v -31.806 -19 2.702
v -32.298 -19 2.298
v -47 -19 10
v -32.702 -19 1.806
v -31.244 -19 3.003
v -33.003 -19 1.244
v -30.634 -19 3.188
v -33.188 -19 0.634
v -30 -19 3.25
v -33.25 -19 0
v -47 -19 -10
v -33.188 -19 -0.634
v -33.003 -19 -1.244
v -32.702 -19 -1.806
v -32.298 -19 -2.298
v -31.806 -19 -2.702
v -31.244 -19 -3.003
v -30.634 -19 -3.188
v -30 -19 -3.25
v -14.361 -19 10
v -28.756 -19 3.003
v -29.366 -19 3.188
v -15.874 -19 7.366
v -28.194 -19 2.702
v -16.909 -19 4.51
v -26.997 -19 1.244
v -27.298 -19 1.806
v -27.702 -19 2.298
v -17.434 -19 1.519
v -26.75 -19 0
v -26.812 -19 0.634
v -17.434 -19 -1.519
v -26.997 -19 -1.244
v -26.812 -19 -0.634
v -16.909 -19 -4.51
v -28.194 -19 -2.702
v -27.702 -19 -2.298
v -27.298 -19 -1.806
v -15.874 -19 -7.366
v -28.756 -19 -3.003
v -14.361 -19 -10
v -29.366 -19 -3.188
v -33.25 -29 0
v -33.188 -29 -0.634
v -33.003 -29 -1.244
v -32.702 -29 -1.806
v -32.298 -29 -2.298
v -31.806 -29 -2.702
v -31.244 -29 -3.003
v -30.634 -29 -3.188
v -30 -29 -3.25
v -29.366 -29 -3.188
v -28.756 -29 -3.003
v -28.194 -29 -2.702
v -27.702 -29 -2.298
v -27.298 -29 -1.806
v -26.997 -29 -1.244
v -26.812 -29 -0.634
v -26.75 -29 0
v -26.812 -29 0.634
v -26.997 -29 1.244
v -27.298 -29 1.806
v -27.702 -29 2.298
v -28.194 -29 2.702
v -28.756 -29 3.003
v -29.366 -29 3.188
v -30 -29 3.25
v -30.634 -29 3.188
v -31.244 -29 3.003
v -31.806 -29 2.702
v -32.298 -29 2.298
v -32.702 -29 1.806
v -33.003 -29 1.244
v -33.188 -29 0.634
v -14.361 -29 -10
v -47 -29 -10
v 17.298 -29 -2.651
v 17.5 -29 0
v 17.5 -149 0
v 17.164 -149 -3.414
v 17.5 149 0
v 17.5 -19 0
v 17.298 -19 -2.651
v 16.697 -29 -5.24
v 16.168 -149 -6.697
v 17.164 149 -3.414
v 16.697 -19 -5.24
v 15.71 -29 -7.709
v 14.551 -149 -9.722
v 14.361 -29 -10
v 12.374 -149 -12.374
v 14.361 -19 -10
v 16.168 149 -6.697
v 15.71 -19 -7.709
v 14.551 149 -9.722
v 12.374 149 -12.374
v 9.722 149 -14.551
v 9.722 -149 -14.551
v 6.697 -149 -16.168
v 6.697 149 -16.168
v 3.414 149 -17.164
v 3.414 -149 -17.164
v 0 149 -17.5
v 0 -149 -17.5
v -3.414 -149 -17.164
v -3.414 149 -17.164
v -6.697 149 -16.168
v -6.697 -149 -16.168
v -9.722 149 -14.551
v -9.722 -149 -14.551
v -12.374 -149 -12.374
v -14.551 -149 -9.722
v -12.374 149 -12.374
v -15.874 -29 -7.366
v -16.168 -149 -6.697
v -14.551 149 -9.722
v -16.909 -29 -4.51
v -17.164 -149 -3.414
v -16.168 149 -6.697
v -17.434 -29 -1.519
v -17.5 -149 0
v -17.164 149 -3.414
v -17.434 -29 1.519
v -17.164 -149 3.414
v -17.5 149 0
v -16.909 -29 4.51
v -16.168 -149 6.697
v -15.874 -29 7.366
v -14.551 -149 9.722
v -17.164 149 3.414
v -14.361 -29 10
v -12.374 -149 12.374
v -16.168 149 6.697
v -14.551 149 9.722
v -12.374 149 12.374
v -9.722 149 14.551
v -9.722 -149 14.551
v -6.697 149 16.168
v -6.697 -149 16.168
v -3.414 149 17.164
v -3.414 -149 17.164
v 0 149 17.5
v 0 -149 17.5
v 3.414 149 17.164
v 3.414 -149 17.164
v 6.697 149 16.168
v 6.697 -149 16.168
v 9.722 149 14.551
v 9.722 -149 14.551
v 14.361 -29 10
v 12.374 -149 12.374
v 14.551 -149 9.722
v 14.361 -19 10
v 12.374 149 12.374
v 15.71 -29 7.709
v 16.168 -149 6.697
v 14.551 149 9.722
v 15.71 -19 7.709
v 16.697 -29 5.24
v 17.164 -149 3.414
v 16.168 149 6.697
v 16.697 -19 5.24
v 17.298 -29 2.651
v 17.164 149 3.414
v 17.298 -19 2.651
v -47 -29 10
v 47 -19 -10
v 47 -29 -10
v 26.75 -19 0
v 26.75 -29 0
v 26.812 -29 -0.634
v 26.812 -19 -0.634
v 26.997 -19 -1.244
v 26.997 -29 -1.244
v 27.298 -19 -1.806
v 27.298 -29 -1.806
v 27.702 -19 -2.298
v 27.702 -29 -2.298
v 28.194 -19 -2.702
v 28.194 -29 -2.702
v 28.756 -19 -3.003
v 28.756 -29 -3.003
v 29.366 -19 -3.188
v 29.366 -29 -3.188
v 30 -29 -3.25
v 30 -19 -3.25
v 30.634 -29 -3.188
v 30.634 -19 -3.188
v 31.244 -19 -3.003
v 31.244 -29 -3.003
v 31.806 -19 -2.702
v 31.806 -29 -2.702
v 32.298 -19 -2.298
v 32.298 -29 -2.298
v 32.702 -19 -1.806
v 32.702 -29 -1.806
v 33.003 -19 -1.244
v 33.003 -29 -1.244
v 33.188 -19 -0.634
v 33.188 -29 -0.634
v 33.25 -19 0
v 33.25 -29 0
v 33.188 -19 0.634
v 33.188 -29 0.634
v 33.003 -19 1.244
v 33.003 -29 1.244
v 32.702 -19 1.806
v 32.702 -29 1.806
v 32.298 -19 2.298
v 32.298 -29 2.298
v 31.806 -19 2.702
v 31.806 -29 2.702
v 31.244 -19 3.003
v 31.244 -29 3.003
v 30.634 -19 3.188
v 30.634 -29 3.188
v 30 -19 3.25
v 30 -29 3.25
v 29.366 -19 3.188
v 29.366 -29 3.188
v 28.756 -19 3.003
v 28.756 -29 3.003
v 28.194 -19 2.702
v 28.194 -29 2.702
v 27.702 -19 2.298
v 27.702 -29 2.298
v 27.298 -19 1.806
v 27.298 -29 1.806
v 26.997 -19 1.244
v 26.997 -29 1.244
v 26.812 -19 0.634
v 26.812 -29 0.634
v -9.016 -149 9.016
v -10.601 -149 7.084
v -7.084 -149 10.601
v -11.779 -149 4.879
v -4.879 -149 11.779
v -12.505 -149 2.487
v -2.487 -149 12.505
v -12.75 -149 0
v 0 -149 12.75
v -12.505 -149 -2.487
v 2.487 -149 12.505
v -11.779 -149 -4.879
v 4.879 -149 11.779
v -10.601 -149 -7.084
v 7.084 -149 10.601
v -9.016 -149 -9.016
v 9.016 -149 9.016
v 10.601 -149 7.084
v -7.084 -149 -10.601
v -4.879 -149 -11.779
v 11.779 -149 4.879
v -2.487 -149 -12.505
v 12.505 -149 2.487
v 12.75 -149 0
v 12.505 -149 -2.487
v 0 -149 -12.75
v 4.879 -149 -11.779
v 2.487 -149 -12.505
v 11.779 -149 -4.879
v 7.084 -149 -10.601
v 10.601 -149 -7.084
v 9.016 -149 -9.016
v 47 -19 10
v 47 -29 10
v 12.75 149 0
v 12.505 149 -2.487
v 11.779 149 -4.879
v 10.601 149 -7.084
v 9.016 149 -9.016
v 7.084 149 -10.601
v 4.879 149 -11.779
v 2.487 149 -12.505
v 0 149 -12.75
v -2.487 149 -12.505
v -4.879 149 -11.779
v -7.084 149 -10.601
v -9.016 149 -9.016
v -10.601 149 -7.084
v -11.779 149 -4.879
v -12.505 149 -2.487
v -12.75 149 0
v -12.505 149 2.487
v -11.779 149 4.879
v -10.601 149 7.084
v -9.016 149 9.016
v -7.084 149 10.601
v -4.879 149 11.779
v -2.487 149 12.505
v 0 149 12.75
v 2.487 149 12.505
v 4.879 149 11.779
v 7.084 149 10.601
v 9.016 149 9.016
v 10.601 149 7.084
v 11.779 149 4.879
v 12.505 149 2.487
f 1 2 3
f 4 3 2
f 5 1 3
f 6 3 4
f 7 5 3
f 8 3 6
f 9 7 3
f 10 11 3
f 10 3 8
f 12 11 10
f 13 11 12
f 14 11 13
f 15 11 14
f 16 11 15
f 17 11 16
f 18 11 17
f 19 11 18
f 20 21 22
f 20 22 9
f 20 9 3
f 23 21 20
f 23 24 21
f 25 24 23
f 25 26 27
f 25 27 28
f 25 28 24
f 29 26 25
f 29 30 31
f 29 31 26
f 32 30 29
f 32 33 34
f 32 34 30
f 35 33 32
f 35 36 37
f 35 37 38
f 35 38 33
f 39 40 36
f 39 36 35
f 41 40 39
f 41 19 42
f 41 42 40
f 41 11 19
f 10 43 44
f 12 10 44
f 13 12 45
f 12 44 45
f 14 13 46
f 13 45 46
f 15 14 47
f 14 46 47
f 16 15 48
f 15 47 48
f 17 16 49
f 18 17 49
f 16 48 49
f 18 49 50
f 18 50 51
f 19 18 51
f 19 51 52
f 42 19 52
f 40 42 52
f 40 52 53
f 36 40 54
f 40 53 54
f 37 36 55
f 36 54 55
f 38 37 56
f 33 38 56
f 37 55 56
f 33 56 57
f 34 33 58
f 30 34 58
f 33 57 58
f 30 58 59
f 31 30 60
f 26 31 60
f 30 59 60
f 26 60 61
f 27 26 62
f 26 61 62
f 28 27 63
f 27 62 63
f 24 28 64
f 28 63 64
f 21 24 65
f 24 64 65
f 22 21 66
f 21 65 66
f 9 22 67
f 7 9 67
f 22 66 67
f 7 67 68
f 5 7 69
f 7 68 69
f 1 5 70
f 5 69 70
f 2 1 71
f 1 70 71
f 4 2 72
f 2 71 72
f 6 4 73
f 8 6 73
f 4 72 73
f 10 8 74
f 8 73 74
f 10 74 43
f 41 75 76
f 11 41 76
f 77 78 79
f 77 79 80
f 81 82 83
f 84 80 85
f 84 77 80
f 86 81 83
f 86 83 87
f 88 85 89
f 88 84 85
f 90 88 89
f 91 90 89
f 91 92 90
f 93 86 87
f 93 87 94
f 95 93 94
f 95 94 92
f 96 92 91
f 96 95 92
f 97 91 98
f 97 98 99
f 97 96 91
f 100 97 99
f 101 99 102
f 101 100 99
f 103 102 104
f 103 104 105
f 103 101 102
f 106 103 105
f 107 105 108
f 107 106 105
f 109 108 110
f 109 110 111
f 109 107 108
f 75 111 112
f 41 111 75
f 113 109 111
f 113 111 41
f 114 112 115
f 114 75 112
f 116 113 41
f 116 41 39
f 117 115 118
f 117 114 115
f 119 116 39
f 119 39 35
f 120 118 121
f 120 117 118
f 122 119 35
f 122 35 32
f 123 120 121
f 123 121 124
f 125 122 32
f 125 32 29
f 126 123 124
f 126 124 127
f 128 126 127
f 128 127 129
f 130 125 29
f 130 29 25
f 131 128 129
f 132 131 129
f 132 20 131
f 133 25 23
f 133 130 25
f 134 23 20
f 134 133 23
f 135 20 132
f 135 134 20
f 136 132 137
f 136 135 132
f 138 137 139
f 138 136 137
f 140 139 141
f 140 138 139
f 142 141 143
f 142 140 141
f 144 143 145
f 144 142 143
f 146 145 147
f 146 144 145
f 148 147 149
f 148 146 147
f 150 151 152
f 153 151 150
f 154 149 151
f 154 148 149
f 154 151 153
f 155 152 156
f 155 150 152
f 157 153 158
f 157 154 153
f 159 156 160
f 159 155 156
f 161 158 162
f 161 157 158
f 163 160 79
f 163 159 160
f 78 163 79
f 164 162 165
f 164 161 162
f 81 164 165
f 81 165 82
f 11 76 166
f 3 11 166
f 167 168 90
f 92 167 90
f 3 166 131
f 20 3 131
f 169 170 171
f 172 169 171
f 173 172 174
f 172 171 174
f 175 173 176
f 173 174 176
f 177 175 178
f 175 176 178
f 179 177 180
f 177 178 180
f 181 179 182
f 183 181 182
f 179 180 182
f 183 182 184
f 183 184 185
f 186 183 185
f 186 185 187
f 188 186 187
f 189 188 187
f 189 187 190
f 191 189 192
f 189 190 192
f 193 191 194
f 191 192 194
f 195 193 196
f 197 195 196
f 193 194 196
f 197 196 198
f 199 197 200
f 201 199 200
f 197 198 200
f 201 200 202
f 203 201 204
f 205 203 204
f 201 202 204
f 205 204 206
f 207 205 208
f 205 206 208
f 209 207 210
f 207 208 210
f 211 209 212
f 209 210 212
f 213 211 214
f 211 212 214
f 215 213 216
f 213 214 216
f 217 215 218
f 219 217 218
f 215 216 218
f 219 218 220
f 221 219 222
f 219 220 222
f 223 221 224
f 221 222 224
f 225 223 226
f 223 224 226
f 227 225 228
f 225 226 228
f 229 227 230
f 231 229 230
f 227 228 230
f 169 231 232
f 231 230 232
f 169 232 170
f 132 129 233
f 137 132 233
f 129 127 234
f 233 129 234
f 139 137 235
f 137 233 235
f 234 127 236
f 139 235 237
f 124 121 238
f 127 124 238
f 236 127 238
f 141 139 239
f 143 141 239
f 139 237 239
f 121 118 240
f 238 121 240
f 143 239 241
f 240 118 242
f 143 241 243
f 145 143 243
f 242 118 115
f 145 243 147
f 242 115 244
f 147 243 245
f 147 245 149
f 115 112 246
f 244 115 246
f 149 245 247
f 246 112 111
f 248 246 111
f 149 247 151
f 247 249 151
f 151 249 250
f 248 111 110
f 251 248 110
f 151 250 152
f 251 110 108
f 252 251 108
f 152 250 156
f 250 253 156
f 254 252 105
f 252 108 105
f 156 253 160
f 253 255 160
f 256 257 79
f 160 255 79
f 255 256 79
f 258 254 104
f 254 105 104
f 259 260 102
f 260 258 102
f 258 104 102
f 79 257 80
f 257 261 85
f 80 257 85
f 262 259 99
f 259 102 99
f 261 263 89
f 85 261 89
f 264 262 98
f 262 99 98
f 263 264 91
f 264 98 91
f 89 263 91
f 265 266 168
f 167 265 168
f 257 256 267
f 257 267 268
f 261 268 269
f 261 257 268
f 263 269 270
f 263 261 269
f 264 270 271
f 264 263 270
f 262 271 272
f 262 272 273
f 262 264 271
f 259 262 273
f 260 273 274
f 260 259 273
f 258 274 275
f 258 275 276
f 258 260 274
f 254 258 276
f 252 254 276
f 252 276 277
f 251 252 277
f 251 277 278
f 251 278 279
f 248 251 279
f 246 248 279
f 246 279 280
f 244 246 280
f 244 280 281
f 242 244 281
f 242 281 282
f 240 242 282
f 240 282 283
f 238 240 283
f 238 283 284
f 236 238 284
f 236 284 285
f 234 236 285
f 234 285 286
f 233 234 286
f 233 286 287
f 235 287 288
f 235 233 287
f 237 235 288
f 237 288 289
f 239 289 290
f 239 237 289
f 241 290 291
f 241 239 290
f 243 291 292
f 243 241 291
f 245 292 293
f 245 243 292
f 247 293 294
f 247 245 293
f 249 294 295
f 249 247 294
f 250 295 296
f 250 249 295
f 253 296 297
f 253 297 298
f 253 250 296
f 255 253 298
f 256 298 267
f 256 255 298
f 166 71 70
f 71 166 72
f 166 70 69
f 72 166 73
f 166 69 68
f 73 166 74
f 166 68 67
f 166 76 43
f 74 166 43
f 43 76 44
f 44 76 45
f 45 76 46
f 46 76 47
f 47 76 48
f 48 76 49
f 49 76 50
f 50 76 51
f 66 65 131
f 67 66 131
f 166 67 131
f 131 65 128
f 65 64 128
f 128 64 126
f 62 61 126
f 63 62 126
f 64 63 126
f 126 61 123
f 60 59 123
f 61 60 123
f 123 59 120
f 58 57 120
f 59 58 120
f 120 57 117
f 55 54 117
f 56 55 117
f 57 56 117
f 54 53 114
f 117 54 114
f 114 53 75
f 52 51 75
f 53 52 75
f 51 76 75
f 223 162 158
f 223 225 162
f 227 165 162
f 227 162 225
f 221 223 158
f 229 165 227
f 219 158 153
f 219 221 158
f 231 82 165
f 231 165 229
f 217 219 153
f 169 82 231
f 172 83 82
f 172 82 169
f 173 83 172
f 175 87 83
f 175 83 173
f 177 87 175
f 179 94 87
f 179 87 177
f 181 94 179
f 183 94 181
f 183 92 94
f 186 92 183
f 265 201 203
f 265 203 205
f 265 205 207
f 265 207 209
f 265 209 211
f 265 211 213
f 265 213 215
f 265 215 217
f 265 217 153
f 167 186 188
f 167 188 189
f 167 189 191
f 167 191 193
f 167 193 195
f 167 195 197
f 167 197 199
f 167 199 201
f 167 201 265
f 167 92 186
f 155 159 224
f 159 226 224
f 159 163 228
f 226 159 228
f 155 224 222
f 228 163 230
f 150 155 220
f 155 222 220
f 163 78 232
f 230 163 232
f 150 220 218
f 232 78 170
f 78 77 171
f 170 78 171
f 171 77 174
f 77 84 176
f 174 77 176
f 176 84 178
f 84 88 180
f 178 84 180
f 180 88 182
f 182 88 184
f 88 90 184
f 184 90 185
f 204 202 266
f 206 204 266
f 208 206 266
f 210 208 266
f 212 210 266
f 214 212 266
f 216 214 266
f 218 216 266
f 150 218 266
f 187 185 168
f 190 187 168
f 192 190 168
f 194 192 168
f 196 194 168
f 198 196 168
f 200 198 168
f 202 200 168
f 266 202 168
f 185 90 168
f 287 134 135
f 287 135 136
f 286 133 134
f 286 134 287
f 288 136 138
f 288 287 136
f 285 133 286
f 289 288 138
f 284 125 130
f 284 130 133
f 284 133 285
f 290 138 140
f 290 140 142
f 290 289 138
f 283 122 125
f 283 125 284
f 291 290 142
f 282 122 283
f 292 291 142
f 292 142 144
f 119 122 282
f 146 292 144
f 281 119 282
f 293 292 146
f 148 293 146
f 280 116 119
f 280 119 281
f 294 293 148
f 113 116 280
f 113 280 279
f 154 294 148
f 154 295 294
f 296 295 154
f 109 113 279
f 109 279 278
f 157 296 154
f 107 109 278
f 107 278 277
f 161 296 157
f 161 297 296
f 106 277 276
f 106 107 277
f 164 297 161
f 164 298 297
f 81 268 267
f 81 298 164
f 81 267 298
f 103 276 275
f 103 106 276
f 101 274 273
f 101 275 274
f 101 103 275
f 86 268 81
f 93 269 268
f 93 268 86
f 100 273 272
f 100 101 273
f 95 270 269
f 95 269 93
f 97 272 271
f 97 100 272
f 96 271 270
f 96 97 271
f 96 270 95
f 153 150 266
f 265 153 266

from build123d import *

# Parameters (mm, degrees)
SKETCH1_R           = 17.5
SKETCH1_R_2         = 12.75
BOSS_EXTRUDE1_DEPTH = 149
SKETCH3_R           = 3.25
BOSS_EXTRUDE2_DEPTH = 10


with BuildPart() as part:
    # Sketch1 → Boss-Extrude1 (new body, symmetric)
    with BuildSketch(Plane(origin=(0, 0, 0), x_dir=(1, 0, 0), z_dir=(0, 1, 0))):
        Circle(SKETCH1_R)
        Circle(SKETCH1_R_2, mode=Mode.SUBTRACT)
    extrude(amount=BOSS_EXTRUDE1_DEPTH, both=True)

    # Sketch3 → Boss-Extrude2 (add)
    with BuildSketch(Plane(origin=(0, -29, 0), x_dir=(-1, 0, 0), z_dir=(0, -1, 0))):
        with BuildLine():
            Line((47, -10), (7.90964601, -10))
            ThreePointArc((7.90964601, -10), (12.75, 0), (7.90964601, 10))
            Line((7.90964601, 10), (47, 10))
            Line((47, 10), (47, -10))
        make_face()
        with Locations((30, 0)):
            Circle(SKETCH3_R, mode=Mode.SUBTRACT)
        with BuildLine():
            Line((-47, -10), (-47, 10))
            Line((-47, 10), (-7.90964601, 10))
            ThreePointArc((-7.90964601, 10), (-12.75, 0), (-7.90964601, -10))
            Line((-7.90964601, -10), (-47, -10))
        make_face()
        with Locations((-30, 0)):
            Circle(SKETCH3_R, mode=Mode.SUBTRACT)
    extrude(amount=-BOSS_EXTRUDE2_DEPTH)


solid = part.part
